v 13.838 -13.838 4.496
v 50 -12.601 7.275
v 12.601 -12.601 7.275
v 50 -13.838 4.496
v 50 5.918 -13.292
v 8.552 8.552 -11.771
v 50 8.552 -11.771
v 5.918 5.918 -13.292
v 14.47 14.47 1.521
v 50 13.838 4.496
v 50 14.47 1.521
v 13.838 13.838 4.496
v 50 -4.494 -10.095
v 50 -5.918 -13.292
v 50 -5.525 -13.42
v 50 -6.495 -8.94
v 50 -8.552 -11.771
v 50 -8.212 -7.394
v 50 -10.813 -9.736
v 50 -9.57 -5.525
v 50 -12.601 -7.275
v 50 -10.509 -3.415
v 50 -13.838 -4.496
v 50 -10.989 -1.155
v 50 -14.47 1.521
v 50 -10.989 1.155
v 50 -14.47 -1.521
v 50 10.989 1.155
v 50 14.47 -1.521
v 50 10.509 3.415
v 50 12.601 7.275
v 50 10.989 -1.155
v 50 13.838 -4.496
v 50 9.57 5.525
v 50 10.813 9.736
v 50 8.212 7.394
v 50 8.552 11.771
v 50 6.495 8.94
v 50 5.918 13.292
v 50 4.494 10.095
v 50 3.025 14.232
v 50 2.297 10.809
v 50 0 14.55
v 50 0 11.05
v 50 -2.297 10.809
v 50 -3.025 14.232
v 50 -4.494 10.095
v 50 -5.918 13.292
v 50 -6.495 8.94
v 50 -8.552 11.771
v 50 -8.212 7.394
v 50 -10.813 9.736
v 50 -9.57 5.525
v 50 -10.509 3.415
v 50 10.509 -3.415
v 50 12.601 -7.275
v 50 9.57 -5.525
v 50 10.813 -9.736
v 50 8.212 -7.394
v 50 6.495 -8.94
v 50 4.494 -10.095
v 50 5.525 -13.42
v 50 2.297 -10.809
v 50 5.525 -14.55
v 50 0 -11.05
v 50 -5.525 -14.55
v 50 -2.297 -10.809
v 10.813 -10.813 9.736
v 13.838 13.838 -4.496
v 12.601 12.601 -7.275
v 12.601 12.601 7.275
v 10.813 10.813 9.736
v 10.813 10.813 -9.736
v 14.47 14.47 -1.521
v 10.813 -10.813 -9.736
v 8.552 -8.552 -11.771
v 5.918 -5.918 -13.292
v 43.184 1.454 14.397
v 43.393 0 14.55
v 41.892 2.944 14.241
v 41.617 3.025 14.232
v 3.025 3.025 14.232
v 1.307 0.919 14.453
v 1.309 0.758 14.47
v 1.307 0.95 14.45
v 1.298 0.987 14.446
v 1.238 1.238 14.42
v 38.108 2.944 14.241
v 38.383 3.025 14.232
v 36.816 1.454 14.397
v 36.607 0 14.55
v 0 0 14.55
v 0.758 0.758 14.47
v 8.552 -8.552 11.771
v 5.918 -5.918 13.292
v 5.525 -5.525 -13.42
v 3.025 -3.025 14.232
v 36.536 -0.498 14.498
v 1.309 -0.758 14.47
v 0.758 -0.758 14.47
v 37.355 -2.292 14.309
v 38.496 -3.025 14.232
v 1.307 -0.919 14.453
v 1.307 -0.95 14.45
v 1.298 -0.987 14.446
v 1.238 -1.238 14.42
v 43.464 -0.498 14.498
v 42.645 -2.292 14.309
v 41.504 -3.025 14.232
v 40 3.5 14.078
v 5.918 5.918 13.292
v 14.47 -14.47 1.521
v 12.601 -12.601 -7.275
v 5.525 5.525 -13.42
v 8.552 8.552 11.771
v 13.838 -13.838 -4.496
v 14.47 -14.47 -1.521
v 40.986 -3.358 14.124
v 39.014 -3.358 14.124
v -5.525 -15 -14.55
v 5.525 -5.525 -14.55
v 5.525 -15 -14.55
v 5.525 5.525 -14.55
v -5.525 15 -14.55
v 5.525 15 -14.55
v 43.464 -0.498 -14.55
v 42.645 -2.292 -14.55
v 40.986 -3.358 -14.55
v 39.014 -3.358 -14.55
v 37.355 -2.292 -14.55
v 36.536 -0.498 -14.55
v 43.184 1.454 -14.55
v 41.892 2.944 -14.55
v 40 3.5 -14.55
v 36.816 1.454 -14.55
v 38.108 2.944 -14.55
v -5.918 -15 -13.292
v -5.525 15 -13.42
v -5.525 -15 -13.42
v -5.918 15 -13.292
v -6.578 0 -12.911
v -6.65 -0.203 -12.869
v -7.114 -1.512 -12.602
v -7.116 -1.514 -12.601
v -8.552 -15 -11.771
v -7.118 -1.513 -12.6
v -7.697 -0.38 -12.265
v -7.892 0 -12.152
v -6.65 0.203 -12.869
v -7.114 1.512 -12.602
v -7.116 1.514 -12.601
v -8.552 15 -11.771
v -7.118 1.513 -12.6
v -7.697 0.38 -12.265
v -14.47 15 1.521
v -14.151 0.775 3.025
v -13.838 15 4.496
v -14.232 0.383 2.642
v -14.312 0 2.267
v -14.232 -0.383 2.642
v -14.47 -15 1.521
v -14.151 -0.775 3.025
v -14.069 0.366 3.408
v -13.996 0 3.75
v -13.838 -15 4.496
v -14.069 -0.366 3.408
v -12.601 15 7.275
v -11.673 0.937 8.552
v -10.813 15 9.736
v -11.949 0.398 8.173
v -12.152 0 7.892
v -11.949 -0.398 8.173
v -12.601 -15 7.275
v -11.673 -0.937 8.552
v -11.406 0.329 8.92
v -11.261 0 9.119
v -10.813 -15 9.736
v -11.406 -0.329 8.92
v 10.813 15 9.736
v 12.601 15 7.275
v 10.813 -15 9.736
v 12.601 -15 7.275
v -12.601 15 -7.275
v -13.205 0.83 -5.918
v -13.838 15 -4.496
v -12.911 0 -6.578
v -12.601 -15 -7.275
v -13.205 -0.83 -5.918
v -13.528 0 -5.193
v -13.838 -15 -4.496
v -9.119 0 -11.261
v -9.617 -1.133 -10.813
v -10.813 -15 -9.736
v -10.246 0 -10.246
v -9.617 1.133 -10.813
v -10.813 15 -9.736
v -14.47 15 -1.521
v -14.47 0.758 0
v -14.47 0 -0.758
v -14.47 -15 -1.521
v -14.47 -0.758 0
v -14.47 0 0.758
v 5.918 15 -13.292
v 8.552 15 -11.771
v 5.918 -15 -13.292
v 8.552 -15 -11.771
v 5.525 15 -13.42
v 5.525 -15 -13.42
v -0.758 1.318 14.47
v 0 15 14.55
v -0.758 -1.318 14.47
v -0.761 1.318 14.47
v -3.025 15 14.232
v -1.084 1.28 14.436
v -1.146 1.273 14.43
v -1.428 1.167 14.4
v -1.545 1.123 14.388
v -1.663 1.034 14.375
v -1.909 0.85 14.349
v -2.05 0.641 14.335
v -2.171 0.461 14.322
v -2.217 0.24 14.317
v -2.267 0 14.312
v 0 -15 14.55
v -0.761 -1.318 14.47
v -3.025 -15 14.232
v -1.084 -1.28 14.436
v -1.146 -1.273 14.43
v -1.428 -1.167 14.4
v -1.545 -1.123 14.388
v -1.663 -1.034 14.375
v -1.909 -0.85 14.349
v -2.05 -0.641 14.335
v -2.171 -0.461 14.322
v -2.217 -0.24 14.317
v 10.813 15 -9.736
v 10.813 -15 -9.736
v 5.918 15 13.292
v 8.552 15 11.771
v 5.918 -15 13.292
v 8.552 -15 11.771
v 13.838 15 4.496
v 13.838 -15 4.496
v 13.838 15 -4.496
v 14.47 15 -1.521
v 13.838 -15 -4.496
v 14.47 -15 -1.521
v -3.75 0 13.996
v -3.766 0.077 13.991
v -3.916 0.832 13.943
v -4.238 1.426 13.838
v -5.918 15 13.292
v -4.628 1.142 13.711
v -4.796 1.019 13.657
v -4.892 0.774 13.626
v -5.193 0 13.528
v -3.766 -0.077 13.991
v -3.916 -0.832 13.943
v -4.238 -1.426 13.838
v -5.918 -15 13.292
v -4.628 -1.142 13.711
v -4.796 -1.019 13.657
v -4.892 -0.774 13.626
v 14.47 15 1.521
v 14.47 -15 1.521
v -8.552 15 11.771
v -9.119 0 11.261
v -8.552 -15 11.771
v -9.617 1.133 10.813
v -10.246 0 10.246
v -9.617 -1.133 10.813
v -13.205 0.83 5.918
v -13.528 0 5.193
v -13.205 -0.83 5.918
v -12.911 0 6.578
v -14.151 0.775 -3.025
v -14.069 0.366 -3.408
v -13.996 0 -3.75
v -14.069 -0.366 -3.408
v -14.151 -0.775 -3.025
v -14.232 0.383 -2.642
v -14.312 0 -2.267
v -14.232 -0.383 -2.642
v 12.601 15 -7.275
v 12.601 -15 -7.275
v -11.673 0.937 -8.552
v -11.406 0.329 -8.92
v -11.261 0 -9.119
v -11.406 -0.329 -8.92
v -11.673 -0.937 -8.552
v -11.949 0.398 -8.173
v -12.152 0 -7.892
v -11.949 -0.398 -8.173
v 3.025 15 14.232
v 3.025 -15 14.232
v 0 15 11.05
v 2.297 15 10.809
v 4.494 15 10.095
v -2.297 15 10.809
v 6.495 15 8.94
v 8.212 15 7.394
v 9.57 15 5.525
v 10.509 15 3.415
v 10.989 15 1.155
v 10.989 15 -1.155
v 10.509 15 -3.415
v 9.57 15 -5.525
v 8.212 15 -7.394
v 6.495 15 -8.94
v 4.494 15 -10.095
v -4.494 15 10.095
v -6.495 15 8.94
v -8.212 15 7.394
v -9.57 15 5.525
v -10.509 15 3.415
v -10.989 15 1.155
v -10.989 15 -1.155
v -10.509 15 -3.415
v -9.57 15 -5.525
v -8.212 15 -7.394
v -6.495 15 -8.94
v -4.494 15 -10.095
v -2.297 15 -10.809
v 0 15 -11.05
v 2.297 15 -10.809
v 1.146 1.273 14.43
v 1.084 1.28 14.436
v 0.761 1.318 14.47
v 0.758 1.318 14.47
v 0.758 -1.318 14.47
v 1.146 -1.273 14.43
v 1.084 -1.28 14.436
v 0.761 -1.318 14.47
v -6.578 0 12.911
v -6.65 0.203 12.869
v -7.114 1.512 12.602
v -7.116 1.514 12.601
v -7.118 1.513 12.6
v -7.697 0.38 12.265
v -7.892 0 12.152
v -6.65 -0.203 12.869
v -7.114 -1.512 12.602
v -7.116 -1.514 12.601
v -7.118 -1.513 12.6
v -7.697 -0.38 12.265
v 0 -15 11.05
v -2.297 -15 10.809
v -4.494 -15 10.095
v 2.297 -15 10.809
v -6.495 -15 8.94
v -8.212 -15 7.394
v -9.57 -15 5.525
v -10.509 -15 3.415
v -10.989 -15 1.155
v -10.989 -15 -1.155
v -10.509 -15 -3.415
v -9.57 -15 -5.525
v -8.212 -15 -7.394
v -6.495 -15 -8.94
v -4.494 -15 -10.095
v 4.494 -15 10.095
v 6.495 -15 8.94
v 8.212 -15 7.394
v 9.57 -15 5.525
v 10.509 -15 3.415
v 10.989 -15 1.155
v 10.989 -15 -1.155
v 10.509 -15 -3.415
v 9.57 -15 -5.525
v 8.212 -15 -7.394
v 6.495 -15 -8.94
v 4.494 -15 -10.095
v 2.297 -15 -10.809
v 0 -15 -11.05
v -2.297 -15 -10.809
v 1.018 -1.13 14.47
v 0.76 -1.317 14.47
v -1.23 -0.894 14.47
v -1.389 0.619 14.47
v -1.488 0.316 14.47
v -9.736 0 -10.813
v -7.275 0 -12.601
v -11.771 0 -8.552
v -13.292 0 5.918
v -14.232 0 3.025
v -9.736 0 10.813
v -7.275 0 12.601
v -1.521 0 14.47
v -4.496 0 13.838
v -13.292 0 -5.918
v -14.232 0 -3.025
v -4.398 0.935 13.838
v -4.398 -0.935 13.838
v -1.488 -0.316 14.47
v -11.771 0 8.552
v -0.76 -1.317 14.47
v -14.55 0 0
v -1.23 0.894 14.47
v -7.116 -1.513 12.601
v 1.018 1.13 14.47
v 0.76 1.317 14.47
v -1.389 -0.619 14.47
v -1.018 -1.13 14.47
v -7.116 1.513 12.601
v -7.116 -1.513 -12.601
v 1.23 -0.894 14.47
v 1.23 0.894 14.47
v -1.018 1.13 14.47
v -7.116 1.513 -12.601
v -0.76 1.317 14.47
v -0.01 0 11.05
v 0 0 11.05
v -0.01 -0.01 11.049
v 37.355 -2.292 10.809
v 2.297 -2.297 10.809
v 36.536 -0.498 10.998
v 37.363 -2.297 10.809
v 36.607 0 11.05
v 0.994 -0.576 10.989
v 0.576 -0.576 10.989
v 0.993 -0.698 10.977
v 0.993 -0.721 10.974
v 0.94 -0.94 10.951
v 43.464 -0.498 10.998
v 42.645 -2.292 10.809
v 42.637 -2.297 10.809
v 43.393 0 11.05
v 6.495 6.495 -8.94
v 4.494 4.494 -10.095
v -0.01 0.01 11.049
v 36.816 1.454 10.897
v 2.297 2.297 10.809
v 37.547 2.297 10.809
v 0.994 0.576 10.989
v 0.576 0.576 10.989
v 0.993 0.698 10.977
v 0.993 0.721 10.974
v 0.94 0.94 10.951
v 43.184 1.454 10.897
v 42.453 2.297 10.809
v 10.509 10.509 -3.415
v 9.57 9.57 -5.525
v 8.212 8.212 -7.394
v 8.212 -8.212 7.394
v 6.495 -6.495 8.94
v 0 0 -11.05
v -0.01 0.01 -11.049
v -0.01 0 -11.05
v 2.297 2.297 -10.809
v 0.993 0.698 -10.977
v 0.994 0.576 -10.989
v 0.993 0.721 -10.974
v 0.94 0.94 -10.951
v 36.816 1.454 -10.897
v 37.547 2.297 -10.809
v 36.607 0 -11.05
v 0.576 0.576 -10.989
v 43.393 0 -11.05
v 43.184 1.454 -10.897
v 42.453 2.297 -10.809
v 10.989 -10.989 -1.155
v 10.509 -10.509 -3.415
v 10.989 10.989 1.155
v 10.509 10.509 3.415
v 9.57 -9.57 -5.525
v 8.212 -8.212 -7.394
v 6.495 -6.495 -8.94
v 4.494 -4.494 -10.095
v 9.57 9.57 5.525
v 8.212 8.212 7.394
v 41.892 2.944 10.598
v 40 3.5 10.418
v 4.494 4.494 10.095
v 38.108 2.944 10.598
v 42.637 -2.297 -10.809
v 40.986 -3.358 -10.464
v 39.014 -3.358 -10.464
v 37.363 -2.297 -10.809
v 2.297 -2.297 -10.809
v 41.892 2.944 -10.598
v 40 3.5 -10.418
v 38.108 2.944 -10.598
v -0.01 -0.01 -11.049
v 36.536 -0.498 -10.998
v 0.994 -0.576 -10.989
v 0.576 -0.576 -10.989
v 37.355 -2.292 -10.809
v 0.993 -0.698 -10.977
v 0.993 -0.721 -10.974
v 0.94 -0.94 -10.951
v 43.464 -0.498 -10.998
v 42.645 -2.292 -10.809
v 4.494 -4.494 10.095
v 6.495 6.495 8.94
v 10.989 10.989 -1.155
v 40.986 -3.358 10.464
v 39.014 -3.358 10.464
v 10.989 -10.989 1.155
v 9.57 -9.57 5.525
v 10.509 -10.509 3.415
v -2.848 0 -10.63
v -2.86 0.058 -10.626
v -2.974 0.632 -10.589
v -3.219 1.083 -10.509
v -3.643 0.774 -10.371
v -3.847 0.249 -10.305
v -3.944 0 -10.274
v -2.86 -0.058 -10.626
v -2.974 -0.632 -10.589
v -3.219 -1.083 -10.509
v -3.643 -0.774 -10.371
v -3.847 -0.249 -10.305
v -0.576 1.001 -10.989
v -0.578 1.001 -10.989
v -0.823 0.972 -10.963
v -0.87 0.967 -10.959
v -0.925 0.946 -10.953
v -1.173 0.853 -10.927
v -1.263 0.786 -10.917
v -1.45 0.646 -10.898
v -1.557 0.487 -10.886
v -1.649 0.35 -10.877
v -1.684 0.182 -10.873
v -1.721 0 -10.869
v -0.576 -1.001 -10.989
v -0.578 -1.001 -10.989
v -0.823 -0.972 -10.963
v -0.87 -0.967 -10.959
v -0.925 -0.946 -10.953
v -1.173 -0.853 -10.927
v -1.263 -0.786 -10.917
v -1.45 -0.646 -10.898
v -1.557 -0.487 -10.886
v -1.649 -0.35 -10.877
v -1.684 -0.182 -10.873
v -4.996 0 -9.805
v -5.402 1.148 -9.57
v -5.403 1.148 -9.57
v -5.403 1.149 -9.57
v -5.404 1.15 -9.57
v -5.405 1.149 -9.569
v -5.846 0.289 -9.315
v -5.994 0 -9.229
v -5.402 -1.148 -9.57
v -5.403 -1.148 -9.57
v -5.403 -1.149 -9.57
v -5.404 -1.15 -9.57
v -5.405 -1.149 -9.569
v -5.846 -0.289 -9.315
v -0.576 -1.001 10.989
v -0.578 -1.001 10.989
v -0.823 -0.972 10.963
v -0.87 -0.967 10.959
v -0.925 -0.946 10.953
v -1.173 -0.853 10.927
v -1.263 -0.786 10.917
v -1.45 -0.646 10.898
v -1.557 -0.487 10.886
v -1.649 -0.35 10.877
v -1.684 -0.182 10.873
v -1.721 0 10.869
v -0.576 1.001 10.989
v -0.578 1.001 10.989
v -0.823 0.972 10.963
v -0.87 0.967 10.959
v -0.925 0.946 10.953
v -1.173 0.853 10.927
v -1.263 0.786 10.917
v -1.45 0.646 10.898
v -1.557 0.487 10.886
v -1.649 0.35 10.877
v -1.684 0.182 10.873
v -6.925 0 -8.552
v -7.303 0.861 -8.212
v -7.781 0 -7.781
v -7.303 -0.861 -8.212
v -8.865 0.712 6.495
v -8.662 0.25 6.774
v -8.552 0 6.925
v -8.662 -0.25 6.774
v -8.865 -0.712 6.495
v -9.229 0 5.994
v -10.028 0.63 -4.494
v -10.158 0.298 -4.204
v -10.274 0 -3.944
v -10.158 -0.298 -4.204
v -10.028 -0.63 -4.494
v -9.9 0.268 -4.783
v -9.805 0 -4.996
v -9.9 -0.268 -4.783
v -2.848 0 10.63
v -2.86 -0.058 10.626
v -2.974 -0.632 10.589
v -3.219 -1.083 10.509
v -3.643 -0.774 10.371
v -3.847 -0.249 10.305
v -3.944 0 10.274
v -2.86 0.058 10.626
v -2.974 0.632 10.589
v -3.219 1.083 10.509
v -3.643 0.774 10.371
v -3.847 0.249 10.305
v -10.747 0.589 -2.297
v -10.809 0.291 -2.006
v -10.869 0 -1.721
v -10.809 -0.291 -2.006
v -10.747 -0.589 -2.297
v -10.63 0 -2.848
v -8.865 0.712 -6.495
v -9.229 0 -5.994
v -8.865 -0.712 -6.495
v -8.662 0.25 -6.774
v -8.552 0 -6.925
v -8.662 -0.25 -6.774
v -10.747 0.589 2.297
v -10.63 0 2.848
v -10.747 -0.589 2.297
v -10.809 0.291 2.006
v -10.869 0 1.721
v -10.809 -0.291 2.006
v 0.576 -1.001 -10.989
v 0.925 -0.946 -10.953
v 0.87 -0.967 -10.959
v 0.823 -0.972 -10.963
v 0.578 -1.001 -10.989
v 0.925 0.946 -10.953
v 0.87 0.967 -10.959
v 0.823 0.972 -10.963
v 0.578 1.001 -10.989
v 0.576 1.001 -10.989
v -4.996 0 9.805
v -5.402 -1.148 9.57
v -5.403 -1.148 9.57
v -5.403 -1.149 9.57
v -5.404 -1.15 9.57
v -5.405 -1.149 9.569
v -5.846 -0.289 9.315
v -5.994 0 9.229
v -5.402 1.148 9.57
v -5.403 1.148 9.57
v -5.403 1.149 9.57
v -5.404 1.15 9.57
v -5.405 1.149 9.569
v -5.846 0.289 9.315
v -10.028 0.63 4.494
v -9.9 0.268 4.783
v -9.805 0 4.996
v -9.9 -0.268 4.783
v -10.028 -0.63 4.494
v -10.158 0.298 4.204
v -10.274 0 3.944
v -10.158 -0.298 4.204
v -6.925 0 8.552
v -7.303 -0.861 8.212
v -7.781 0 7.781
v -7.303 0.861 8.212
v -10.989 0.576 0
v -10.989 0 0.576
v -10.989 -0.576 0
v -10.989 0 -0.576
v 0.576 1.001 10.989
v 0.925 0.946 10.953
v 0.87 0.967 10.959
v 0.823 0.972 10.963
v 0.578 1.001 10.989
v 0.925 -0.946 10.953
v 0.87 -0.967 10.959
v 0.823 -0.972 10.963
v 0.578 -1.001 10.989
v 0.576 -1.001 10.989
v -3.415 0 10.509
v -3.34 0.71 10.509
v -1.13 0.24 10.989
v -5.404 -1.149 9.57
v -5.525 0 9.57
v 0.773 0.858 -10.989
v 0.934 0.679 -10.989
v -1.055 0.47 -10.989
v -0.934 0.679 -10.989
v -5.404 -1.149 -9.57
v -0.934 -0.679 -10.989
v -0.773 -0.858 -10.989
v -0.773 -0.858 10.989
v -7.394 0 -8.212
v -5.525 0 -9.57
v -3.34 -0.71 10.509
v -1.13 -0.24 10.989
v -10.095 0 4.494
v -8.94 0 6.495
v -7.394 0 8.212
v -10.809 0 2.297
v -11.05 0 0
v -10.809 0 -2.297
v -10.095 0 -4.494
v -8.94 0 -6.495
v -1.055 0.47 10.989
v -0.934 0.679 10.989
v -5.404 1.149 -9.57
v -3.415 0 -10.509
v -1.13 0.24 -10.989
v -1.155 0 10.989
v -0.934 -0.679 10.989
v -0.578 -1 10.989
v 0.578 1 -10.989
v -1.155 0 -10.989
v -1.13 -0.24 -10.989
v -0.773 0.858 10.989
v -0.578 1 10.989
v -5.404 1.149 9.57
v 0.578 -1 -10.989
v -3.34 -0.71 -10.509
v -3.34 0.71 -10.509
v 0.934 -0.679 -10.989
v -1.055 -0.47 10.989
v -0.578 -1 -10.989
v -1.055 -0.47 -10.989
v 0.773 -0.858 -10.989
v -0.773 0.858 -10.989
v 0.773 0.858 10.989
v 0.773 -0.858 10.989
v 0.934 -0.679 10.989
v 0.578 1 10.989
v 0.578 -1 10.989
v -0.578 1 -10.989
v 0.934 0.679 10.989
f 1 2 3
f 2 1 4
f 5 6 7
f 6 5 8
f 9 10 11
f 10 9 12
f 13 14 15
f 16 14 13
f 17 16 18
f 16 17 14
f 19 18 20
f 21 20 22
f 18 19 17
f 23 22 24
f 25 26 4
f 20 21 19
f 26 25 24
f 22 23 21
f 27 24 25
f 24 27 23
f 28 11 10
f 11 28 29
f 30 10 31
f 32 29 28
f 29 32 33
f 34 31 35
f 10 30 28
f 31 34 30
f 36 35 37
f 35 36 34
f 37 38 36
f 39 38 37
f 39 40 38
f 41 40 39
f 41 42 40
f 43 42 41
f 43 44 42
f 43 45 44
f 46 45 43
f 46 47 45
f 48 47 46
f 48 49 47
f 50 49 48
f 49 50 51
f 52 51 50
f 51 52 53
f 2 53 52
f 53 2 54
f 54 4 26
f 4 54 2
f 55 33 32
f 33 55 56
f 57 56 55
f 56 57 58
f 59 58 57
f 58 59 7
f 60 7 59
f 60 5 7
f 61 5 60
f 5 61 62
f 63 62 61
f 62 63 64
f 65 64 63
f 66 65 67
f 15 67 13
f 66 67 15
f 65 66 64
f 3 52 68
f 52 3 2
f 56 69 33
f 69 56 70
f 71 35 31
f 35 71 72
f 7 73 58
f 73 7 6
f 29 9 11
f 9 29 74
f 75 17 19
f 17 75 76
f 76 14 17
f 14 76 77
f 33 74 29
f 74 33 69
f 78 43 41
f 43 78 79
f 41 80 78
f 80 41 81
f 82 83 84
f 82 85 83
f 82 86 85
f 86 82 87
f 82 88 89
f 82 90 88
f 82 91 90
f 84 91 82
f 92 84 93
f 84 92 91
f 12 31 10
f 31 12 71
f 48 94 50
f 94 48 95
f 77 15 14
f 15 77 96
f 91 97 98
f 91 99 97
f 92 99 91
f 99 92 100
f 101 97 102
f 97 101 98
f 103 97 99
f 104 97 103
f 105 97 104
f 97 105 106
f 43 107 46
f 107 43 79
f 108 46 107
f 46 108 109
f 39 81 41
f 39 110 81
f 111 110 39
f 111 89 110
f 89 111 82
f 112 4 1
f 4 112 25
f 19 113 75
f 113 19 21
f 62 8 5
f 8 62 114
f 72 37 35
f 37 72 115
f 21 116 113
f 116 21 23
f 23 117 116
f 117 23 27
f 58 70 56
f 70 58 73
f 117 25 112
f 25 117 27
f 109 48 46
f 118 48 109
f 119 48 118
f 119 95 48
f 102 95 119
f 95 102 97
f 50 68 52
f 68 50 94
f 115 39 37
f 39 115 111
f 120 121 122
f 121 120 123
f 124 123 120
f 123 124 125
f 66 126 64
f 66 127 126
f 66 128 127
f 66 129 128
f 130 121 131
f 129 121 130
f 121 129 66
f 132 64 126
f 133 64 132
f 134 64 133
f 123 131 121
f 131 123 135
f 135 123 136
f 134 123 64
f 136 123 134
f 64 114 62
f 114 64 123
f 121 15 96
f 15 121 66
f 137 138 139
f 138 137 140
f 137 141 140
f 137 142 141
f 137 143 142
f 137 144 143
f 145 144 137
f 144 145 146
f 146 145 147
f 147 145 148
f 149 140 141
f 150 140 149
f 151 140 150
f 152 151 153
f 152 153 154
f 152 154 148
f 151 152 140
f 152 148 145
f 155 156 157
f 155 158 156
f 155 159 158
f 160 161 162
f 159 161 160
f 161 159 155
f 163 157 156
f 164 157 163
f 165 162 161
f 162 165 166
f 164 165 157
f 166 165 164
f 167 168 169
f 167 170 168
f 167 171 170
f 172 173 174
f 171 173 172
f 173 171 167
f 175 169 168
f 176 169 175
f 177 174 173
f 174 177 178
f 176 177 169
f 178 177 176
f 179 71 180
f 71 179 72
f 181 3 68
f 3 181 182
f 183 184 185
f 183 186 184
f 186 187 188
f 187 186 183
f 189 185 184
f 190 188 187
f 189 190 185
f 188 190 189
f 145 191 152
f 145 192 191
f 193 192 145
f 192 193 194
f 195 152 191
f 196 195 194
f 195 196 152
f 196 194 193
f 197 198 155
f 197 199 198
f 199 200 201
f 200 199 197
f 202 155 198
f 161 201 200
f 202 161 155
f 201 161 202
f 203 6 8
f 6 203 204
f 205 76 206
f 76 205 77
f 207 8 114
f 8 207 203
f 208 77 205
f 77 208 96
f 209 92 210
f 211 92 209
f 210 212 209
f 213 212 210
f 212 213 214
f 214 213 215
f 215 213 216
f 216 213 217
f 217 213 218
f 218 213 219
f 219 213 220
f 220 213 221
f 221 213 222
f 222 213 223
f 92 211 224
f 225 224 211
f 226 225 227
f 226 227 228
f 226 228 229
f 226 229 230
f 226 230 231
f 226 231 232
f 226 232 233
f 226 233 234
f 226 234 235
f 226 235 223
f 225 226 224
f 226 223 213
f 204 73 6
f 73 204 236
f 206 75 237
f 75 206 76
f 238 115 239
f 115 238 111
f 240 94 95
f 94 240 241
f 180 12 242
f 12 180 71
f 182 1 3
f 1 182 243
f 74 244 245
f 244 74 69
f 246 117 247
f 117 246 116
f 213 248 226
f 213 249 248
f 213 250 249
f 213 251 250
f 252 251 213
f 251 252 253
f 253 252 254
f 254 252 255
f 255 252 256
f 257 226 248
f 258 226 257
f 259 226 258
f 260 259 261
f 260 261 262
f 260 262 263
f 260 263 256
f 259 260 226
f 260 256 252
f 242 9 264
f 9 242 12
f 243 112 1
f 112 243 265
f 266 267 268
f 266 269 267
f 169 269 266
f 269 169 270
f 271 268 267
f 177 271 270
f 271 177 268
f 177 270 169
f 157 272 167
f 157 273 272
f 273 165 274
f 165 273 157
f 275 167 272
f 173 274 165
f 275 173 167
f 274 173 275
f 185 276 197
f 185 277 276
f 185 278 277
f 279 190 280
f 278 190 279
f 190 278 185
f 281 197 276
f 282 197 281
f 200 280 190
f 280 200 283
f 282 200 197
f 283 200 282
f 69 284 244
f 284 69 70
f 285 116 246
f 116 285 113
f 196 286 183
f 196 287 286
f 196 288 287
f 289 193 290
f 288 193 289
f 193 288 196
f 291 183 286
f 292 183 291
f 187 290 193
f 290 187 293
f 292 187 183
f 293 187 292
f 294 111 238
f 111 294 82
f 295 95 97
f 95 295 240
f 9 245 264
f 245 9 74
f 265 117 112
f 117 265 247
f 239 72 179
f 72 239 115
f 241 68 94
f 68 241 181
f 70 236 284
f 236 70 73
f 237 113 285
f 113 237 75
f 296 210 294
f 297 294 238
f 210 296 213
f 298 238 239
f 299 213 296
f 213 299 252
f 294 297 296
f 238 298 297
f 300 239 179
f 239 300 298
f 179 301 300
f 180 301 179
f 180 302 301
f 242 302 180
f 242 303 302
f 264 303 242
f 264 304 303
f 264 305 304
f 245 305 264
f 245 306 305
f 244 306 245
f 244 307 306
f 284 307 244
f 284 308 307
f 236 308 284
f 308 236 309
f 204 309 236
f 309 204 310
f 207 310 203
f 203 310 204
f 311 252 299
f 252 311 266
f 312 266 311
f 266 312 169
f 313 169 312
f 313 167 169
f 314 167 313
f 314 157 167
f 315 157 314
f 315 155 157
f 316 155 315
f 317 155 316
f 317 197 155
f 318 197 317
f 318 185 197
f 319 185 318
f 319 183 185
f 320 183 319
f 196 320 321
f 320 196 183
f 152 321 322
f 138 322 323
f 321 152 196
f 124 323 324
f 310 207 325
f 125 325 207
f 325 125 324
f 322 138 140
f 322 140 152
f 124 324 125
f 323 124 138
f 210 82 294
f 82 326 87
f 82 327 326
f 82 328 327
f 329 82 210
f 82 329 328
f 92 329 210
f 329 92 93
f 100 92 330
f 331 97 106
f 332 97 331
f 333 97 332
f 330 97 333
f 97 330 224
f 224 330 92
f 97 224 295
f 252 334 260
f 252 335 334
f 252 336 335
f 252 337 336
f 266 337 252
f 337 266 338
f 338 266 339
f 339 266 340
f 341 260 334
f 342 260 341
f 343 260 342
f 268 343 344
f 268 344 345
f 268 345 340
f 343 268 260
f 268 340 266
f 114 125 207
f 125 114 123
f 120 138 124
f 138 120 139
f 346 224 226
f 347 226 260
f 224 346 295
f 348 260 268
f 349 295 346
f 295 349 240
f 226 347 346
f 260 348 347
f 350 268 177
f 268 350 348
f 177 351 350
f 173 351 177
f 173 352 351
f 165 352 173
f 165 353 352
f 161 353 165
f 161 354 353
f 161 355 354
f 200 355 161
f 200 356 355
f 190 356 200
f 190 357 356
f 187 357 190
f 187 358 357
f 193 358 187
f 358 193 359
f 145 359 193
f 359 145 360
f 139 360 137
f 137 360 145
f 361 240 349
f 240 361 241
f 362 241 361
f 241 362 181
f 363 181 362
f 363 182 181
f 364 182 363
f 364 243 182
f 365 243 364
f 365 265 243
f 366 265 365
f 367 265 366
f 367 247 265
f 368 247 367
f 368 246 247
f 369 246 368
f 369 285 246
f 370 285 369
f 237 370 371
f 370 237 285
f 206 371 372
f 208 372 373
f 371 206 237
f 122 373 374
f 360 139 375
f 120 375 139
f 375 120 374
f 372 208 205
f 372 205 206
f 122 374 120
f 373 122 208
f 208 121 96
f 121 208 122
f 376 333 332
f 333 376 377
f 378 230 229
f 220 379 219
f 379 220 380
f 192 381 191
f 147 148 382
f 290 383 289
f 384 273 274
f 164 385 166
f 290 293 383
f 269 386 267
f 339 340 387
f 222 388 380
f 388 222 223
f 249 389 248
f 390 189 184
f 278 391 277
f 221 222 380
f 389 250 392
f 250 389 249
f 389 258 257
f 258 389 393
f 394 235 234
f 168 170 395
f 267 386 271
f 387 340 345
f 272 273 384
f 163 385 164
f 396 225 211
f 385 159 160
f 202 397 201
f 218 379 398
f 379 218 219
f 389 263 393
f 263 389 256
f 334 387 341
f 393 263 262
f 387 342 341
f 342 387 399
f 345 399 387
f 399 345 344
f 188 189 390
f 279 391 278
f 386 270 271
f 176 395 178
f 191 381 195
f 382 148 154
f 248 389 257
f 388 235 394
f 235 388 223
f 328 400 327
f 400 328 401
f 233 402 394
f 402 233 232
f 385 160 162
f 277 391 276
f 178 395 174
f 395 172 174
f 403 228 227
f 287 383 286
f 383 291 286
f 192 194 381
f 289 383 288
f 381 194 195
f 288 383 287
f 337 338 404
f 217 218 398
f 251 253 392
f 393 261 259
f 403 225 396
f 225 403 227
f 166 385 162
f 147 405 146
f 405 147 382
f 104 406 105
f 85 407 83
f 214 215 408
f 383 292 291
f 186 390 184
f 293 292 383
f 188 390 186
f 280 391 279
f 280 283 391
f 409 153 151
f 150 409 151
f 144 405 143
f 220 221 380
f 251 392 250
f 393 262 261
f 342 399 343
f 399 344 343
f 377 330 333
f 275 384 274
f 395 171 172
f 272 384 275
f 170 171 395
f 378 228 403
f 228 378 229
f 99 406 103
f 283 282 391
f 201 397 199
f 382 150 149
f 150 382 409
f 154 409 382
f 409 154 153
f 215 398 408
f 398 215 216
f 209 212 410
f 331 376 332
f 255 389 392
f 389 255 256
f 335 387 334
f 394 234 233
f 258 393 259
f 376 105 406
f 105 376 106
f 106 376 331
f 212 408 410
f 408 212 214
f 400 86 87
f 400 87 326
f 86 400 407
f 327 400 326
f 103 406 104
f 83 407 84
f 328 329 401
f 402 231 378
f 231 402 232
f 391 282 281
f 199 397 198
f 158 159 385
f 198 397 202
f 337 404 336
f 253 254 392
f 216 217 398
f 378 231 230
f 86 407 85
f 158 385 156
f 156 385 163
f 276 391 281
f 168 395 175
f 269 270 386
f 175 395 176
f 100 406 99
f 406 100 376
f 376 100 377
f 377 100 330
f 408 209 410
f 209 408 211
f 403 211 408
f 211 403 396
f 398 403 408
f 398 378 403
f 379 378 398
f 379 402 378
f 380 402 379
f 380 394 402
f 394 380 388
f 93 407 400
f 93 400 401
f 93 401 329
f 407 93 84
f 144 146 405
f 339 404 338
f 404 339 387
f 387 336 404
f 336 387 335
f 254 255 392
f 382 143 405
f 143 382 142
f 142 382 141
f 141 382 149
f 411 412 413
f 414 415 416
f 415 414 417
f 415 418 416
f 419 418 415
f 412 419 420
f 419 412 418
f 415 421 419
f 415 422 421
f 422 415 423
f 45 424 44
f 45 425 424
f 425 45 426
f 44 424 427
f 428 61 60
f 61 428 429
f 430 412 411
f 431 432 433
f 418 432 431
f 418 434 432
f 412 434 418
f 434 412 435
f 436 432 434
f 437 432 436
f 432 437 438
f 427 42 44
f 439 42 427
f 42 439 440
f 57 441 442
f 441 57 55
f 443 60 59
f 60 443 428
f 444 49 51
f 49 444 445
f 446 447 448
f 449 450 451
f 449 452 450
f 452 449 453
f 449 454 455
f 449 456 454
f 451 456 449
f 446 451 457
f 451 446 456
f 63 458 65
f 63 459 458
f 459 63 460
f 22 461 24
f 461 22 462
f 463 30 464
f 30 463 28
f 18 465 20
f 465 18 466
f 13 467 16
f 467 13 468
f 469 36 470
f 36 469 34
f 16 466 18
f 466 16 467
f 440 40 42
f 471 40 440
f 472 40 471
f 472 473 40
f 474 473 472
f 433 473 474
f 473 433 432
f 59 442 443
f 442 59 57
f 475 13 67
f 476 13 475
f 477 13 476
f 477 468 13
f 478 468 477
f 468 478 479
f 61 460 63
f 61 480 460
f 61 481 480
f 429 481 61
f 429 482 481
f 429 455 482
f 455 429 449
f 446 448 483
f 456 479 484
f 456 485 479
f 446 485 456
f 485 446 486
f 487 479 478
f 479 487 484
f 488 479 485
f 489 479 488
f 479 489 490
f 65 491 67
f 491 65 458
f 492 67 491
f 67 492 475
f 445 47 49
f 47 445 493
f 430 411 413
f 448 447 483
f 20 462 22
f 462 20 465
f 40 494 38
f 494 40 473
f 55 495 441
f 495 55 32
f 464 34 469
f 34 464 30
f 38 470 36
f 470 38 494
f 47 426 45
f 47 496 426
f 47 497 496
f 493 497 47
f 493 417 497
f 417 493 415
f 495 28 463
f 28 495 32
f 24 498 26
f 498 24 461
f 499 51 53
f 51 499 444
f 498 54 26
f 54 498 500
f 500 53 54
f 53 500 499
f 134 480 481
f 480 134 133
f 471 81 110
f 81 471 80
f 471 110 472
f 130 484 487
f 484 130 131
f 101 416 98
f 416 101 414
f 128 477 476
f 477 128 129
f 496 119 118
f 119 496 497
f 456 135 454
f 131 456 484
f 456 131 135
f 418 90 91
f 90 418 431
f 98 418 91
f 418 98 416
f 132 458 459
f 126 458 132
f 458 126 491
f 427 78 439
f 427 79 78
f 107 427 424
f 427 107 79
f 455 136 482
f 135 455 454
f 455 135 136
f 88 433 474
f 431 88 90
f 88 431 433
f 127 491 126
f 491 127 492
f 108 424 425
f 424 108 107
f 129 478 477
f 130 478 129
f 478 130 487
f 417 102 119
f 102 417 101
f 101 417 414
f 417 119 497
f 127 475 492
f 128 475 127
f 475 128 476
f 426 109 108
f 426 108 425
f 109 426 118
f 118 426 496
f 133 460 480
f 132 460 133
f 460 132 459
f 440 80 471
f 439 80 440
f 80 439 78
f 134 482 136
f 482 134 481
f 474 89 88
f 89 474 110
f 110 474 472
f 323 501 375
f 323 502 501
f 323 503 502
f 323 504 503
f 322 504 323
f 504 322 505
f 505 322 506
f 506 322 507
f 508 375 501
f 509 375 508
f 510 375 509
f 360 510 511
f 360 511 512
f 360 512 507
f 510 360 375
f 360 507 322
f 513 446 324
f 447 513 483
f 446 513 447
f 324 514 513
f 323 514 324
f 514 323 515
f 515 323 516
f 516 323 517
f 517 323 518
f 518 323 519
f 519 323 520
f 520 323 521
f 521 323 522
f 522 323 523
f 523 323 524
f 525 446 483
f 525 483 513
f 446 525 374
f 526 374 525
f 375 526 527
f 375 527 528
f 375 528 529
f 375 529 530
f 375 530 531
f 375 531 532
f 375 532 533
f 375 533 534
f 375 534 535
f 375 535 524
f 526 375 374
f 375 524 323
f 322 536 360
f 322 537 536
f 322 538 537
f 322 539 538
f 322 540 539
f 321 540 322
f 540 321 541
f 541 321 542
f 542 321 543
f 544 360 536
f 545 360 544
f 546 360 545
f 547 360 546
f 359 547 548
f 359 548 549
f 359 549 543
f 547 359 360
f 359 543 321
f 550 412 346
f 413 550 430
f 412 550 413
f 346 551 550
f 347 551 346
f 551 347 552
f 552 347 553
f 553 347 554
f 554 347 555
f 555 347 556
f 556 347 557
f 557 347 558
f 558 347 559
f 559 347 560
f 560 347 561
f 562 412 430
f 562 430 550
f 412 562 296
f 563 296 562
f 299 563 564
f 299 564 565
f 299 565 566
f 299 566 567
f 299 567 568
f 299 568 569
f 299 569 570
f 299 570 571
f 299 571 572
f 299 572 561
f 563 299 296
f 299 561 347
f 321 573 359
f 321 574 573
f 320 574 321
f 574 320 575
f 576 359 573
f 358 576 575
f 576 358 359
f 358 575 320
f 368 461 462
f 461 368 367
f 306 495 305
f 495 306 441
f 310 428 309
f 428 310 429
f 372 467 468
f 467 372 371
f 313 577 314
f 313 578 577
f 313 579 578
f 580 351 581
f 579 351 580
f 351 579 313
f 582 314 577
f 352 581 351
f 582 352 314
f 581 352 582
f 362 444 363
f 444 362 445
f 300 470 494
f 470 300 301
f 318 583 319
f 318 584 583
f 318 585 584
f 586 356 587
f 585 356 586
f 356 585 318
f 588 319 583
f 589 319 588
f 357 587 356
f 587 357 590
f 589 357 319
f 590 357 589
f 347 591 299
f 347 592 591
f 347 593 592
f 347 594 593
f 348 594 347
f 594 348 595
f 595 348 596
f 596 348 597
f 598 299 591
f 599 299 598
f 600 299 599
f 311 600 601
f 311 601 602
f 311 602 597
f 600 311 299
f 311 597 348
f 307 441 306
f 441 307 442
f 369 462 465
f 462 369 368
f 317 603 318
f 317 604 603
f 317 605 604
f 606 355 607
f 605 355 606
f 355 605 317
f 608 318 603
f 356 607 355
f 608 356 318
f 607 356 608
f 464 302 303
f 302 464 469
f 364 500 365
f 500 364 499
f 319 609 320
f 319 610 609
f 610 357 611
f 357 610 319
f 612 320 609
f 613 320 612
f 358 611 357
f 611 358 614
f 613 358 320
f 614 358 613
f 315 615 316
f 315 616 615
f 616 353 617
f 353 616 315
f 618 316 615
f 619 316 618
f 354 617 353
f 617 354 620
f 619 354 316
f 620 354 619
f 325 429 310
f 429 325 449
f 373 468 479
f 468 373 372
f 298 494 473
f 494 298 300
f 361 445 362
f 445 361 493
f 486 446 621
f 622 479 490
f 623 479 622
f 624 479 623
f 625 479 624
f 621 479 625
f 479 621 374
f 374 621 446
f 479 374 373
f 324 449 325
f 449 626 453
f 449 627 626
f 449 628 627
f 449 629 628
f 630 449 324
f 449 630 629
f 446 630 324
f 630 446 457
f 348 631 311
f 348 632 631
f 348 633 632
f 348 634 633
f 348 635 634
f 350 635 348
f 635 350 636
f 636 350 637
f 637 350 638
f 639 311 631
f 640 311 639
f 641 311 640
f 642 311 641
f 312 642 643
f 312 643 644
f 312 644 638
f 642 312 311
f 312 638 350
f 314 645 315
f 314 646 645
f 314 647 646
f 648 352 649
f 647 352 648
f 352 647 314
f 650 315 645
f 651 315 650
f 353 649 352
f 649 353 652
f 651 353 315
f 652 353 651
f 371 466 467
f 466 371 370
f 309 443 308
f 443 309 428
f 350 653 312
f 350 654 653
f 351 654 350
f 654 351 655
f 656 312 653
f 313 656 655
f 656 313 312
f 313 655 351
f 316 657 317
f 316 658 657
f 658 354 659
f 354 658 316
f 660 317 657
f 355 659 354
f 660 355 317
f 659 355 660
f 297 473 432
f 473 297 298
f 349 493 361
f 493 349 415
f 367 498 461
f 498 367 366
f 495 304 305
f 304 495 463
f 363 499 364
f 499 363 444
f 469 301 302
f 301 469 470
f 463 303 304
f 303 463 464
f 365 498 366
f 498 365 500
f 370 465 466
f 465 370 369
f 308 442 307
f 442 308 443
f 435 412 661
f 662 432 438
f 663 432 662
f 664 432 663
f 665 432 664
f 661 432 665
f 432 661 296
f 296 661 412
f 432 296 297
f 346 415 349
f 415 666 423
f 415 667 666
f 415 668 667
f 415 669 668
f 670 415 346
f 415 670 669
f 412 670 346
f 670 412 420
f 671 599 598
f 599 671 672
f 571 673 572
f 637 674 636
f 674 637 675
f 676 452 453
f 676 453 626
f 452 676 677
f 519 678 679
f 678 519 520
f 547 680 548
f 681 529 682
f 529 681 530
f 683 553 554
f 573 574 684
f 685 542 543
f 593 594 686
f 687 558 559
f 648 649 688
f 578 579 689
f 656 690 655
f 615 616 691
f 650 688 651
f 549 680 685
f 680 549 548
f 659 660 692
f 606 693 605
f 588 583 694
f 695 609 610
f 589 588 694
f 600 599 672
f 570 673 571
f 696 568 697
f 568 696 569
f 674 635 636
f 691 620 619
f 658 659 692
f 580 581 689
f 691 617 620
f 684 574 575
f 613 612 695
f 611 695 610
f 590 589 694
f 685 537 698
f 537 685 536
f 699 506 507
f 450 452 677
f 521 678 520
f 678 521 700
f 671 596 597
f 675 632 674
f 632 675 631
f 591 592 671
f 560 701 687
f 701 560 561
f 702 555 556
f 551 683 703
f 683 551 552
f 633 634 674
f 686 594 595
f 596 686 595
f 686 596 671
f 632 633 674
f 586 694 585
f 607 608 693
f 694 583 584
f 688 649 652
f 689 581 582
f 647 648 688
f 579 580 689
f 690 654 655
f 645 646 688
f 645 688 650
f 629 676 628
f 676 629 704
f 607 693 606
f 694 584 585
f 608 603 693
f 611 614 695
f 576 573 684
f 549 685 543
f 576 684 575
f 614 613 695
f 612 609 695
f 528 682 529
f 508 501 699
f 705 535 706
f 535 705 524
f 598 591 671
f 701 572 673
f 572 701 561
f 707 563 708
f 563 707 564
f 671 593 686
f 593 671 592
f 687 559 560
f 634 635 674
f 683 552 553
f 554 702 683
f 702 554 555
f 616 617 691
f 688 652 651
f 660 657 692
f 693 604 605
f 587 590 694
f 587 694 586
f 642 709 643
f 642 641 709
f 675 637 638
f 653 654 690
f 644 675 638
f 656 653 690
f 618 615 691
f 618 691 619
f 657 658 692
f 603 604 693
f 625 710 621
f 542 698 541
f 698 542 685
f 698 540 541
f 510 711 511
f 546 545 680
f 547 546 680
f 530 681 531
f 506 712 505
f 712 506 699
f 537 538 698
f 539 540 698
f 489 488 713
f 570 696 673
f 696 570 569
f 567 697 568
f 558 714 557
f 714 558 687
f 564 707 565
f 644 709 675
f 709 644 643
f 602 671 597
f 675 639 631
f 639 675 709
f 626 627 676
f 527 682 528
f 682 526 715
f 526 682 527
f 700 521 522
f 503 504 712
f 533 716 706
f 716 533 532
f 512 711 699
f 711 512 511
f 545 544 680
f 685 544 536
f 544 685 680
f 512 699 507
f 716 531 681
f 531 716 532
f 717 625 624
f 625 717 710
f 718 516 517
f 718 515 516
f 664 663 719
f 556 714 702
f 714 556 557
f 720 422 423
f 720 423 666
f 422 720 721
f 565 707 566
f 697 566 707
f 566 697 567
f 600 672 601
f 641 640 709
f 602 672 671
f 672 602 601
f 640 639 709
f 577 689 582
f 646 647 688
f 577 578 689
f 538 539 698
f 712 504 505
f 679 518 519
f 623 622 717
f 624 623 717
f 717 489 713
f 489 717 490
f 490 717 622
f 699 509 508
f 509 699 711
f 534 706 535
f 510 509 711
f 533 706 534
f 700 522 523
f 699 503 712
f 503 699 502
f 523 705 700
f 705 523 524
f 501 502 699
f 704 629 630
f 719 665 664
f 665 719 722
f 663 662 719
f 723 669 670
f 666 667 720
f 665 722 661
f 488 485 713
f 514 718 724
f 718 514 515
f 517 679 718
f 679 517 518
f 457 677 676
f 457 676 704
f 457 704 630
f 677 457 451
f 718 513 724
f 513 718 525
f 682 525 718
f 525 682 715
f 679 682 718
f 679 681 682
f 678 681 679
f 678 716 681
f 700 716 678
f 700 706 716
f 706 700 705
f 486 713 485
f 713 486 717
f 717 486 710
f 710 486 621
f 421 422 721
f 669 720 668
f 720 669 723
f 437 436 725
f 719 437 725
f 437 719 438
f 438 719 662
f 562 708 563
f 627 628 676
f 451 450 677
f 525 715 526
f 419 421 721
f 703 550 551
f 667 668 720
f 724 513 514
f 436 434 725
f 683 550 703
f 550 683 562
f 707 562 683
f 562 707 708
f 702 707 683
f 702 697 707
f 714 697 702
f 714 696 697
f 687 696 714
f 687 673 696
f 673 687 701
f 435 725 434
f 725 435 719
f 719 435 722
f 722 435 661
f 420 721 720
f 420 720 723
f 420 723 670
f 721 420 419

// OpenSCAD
// file: modules/jointModule.scad
// Modules
// legs is a vector of legs,
//      each leg is a vector containing:
//      vector of the joint rotation
// horizontalPipeInsideDiameter
// Optional Boolean requesting addition of a flat bottom
// Optional Boolean or number requesting a hole drilled near the end,
//      If it is a number, this is the angle at which it should be drilled.
//      For historical reasons, 0 and true are equivalent
//      Use false when you need to skip this but still add another vector entry
// Option integer indicating an override for the length of this leg
// i.e. [[x, y, z], horizontalPipeInsideDiameter]

/*
i.e.
jointLegs = [
        [[0, 90, 0], horizontalPipeInsideDiameter, true, true],
        [[90, 90, 0], horizontalPipeInsideDiameter, true, 45],
        [[90, 90, 180], horizontalPipeInsideDiameter, true, 90, 500],
    ];

 */

// This function makes creating the array for the joint module much easier.
// Just name any parameters and skip those you don't care about and defaults will be injected.
// The only REQUIRED paremeter is the insideDiameter, although a suitable default could be added here (instead of 0, so technically it isn't required).
function legInstance(rotation = [0, 0, 0], insideDiameter = 0, flatBottom = false, pinHole = false, length = false,
triangleSupport = false, labelText = false, reverseText = false) = [rotation,
  insideDiameter, flatBottom, pinHole, length, triangleSupport, labelText, reverseText];

// Pinholes have to be further from the ends because the ends are cut off to fit in the print bed.
module joint(legs = [], sphereJointInsideDiameter = 0, closeUpWithSphere = false, addCircleToFlatBottom = false, jointPinHoleOffset = jointPinHoleOffset)
{
  difference()
    {
      // Build
      union() color(JointColor)
        {
          for (leg = legs) {
            thisJointLegLength = len(leg) > 4 && leg[4] != false ? leg[4] : jointLegLength;
            rotate(leg[0])
              cylinder(
              h = thisJointLegLength,
              r = (leg[1] + jointWallThickness * 2) / 2);

            // Add flat bottom
            if (leg[2]) {
              rotate(leg[0])
                translate([
                    (leg[1] / 2) + (jointWallThickness / 2),
                  0,
                    thisJointLegLength / 2
                  ])
                  cube([
                    jointWallThickness,
                    // The 0.5 is a guess at width. A parameter would probably be better.
                      leg[1] * 0.5,
                    thisJointLegLength
                    ],
                  center = true);
            }

            // Triangles for improving stength
            if (len(leg) > 5 && leg[5] != false) {

              // TODO: Document this
              thisTrianglePointA = leg[5][0] ? leg[5][0] : 10;
              thisTriangleRotateZ = leg[5][1] ? leg[5][1] : leg[0][2] * 1.5;
              thisTrianglePointB = leg[5][2] ? leg[5][2] : 40;
              thisTriangleRotatex = leg[5][3] ? leg[5][3] : 90 - leg[0][1];
              thisTriangleRotateY = leg[5][4] ? leg[5][4] : 0;

              rotate([thisTriangleRotatex, thisTriangleRotateY, thisTriangleRotateZ])
                linear_extrude(height = 8, center = true, convexity = 10, twist = 0)
                  polygon(points = [[thisTrianglePointA, thisTrianglePointB], [0, 0], [
                    thisTrianglePointB, thisTrianglePointA]],
                  paths =
                    [[0, 1, 2]]);
            }
          }

          if (closeUpWithSphere)
          // Use a Sphere to close up the gap between the pipes.
          // This is kinda hacky, but it looks good to me and does the job.
            sphere(d = sphereJointInsideDiameter + jointWallThickness * 2);

          if (addCircleToFlatBottom)
          // Add a cylinder at the end of the leg to close any gap between leg flats
          // This also creates a solid floor in case the sphere is so big
          // that the cut below cuts off the bottom of it.
            rotate(legs[0][0])
              rotate([0, 90, 0])
                translate([
                  0,
                  0,
                    legs[0][1] / 2,
                  ])
                  cylinder(h = jointWallThickness, r = (legs[0][1] * 0.5) / 2);

        }

      // Hollow out
      union()
        {
          for (leg = legs) {
            thisJointLegLength = len(leg) > 4 && leg[4] != false ? leg[4] : jointLegLength;
            // The -0.01 ensures that the end of the tube is clear.
            rotate(leg[0]) translate([0, 0, - 0.01]) cylinder(
            h = thisJointLegLength + 0.02, r = leg[1] / 2);

            // IF a flat bottom was added, also add a "cut" to ensure nothing
            // else in the part extends below this flat bottom.
            if (leg[2]) {
              rotate(leg[0])
                translate([
                    (leg[1] / 2) + (jointWallThickness * 2),
                  0,
                    thisJointLegLength / 2
                  ])
                  cube([
                    // The 0.00001 just ensures it doesn't clip the flat on the legs at all.
                        jointWallThickness * 2 - 0.00001,
                      leg[1] * 2,
                      thisJointLegLength * 2
                    ],
                  center = true);
            }
            if (len(leg) > 3 && leg[3] != false) {
              // Make a hole near the end of the leg for pinning
              // The -0.01 ensures that the end of the tube is clear.
              rotate([leg[0][0] + 90, leg[0][1], leg[0][2]])
                translate([0,
                    thisJointLegLength - jointPinHoleOffset, 0])
                  rotate([0, leg[3] == true ? 0 : leg[3],
                    0])
                    cylinder(
                    h = leg[1] + jointWallThickness * 2 + 0.01, d = jointPinningHoleDiameter, center
                    = true);
            }
            // Add text to bottom of a flat leg
            if (len(leg) > 6 && leg[6] != false) {
              rotate([leg[0][0], leg[0][1] + 90, leg[0][2]])
                translate([
                      - thisJointLegLength + jointPinHoleOffset + jointPinningHoleDiameter
                  ,
                  0,
                        sphereJointInsideDiameter / 2 + jointWallThickness - 1
                  ])
                  mirror([0, leg[7] == true ? 1 : 0, 0])
                    linear_extrude(1.1)
                      text(leg[6], size = 5, font = "Liberation Mono", valign = "center", halign =
                      "left");
            }
          }

          if (closeUpWithSphere) {
            // Hollow out the sphere
            sphere(d = sphereJointInsideDiameter);
          }

        }
    }
}
// file: parameters/commonParameters.scad
// All measurements in millimeters

// "horizontal" and "vertical" refer to how they are printed on the print bed,
// not how they work on the final assembly.
// ALWAYS print verticle pipes straight up if possible, that is 90 degrees from the bed.
// Attempting to print a slanted pipe will be troublesome and require testing for a proper size.
// However, you can print ANY angle ON the bed.

// 1.25" PVC Pipe:
horizontalPipeInsideDiameter_1_25pvc = 42.9;
verticalPipeInsideDiameter_1_25pvc = 42.5;

// 0.5" PVC Pipe:
horizontalPipeInsideDiameter_0_50pvc = 22.1;
verticalPipeInsideDiameter_0_50pvc = 21.7;

// Parameters
jointLegLength = 50;
jointWallThickness = 3.5;
jointPinningHoleDiameter = 7;
jointPinHoleOffset = 10;

// Walker Foot Parameters
inchesToMmConversionFactor = 25.4;

// Current idea is 11 x 21 inches.
walkerFootHeight = 11 * inchesToMmConversionFactor;
walkerFootLength = 21 * inchesToMmConversionFactor;
// Back of Foot is 4 inches longer to cause foot to hang AND LOOK as desired
// I tried 1 inch and it had basically NO affect on how it hangs.
// I think it looks cool at 4 inches, so I am going to test that.
// I *THINK* that it actually doesn't affect lenght of the walker, because the front
// of one compensates for the back of the other.
walkerFootCenterOffset = 0 * inchesToMmConversionFactor; // Remember to multiply any offset by the conversion factor.
walkerFootFrontLength = (walkerFootLength / 2) - (walkerFootCenterOffset / 2);
walkerFootBackLength = (walkerFootLength / 2) + (walkerFootCenterOffset / 2);

footLowerJointLegLength = 75;

// Angles
// This site is great for visualizing what you want: https://www.blocklayer.com/trig/scaleneeng.aspx
// Use this site to check your math and results: https://www.calculator.net/right-triangle-calculator.html
//echo("=======================================================");
//echo("Walker Foot Parameters");
//echo("walkerFootLength", walkerFootLength, walkerFootFrontLength + walkerFootBackLength);
//echo("=======================================================");
//echo("Front:");
//echo("walkerFootHeight (a)", walkerFootHeight);
//echo("walkerFootFrontLength (b)", walkerFootFrontLength);
//walkerFootFrontTriangleTopLength = sqrt(pow(walkerFootHeight, 2) + pow(walkerFootFrontLength, 2));
//echo("walkerFootFrontTriangleTopLength (c)", walkerFootFrontTriangleTopLength);
//walkerFootFrontJointAngle = asin(walkerFootHeight / walkerFootFrontTriangleTopLength);
//echo("walkerFootFrontJointAngle (α):", walkerFootFrontJointAngle);
//walkerAnkleFrontAngle = asin(walkerFootFrontLength / walkerFootFrontTriangleTopLength);
//echo("walkerAnkleFrontAngle (β)", walkerAnkleFrontAngle);
//echo("-------------------------------------------------------");
//echo("Back");
//echo("walkerFootBackLength (b)", walkerFootBackLength);
//walkerFootBackTriangleTopLength = sqrt(pow(walkerFootHeight, 2) + pow(walkerFootBackLength, 2));
//echo("walkerFootBackTriangleTopLength (c)", walkerFootBackTriangleTopLength);
//walkerFootBackJointAngle = asin(walkerFootHeight / walkerFootBackTriangleTopLength);
//echo("walkerFootBackJointAngle (α):", walkerFootBackJointAngle);
//walkerAnkleBackAngle = asin(walkerFootBackLength / walkerFootBackTriangleTopLength);
//echo("walkerAnkleBackAngle (β)", walkerAnkleBackAngle);
//echo("=======================================================");



// This height is purely based on giving space for nice triangles supports.
// It could be shorter, just be sure to adjust the triangles.
walkerBodyLowerShaftHolderRollerBearingHeightAboveThrustBearing = 50;

// 12v Battery Box
batteryHolderWallThickness = 5;

// Battery Dimensions
// https://www.power-sonic.com/product/ps-1290/
batteryHeight = 94;
batteryWidth = 65.6; // Ben uses 65.6, Web Site says 65
batteryLength = 150.6; // Ben uses 150.6, Web site says 141
batteryBoxDepth = 60; // This is arbitrary. Ben uses 60 for the Dalek

// Colors
JointColor = "CornflowerBlue";
PipeColor = "Pink";

// Resoution
// This is perfect for 3D Printing,
// but you may want to comment it out while working to improve preview
// performance
//$fa = 1;
//$fs = 0.4;
// Although this makes it VERY high rez, which might be better for the slicer? Experimenting with it instead.
// NOTE that using $fn causes FreeCAD and hence .step files exported to Fusion 360 to show round items as a series of faces instead of a single object.
//$fn = 500;
// main file
// Load in some defaults
include <parameters/commonParameters.scad>;

// Pick what size pipes you are using
horizontalPipeInsideDiameter = horizontalPipeInsideDiameter_0_50pvc;

include <modules/jointModule.scad>;

module tJoint()
{
    jointLegs = [
            [[0, 90, 0], horizontalPipeInsideDiameter, true, 90, false, false],
            [[0, 90, 90], horizontalPipeInsideDiameter, true, false, 15],
            [[0, 90, -90], horizontalPipeInsideDiameter, true, false, 15],
        ];

    rotate([0, 0, 0]) joint(jointLegs, horizontalPipeInsideDiameter, true);
}

tJoint();
